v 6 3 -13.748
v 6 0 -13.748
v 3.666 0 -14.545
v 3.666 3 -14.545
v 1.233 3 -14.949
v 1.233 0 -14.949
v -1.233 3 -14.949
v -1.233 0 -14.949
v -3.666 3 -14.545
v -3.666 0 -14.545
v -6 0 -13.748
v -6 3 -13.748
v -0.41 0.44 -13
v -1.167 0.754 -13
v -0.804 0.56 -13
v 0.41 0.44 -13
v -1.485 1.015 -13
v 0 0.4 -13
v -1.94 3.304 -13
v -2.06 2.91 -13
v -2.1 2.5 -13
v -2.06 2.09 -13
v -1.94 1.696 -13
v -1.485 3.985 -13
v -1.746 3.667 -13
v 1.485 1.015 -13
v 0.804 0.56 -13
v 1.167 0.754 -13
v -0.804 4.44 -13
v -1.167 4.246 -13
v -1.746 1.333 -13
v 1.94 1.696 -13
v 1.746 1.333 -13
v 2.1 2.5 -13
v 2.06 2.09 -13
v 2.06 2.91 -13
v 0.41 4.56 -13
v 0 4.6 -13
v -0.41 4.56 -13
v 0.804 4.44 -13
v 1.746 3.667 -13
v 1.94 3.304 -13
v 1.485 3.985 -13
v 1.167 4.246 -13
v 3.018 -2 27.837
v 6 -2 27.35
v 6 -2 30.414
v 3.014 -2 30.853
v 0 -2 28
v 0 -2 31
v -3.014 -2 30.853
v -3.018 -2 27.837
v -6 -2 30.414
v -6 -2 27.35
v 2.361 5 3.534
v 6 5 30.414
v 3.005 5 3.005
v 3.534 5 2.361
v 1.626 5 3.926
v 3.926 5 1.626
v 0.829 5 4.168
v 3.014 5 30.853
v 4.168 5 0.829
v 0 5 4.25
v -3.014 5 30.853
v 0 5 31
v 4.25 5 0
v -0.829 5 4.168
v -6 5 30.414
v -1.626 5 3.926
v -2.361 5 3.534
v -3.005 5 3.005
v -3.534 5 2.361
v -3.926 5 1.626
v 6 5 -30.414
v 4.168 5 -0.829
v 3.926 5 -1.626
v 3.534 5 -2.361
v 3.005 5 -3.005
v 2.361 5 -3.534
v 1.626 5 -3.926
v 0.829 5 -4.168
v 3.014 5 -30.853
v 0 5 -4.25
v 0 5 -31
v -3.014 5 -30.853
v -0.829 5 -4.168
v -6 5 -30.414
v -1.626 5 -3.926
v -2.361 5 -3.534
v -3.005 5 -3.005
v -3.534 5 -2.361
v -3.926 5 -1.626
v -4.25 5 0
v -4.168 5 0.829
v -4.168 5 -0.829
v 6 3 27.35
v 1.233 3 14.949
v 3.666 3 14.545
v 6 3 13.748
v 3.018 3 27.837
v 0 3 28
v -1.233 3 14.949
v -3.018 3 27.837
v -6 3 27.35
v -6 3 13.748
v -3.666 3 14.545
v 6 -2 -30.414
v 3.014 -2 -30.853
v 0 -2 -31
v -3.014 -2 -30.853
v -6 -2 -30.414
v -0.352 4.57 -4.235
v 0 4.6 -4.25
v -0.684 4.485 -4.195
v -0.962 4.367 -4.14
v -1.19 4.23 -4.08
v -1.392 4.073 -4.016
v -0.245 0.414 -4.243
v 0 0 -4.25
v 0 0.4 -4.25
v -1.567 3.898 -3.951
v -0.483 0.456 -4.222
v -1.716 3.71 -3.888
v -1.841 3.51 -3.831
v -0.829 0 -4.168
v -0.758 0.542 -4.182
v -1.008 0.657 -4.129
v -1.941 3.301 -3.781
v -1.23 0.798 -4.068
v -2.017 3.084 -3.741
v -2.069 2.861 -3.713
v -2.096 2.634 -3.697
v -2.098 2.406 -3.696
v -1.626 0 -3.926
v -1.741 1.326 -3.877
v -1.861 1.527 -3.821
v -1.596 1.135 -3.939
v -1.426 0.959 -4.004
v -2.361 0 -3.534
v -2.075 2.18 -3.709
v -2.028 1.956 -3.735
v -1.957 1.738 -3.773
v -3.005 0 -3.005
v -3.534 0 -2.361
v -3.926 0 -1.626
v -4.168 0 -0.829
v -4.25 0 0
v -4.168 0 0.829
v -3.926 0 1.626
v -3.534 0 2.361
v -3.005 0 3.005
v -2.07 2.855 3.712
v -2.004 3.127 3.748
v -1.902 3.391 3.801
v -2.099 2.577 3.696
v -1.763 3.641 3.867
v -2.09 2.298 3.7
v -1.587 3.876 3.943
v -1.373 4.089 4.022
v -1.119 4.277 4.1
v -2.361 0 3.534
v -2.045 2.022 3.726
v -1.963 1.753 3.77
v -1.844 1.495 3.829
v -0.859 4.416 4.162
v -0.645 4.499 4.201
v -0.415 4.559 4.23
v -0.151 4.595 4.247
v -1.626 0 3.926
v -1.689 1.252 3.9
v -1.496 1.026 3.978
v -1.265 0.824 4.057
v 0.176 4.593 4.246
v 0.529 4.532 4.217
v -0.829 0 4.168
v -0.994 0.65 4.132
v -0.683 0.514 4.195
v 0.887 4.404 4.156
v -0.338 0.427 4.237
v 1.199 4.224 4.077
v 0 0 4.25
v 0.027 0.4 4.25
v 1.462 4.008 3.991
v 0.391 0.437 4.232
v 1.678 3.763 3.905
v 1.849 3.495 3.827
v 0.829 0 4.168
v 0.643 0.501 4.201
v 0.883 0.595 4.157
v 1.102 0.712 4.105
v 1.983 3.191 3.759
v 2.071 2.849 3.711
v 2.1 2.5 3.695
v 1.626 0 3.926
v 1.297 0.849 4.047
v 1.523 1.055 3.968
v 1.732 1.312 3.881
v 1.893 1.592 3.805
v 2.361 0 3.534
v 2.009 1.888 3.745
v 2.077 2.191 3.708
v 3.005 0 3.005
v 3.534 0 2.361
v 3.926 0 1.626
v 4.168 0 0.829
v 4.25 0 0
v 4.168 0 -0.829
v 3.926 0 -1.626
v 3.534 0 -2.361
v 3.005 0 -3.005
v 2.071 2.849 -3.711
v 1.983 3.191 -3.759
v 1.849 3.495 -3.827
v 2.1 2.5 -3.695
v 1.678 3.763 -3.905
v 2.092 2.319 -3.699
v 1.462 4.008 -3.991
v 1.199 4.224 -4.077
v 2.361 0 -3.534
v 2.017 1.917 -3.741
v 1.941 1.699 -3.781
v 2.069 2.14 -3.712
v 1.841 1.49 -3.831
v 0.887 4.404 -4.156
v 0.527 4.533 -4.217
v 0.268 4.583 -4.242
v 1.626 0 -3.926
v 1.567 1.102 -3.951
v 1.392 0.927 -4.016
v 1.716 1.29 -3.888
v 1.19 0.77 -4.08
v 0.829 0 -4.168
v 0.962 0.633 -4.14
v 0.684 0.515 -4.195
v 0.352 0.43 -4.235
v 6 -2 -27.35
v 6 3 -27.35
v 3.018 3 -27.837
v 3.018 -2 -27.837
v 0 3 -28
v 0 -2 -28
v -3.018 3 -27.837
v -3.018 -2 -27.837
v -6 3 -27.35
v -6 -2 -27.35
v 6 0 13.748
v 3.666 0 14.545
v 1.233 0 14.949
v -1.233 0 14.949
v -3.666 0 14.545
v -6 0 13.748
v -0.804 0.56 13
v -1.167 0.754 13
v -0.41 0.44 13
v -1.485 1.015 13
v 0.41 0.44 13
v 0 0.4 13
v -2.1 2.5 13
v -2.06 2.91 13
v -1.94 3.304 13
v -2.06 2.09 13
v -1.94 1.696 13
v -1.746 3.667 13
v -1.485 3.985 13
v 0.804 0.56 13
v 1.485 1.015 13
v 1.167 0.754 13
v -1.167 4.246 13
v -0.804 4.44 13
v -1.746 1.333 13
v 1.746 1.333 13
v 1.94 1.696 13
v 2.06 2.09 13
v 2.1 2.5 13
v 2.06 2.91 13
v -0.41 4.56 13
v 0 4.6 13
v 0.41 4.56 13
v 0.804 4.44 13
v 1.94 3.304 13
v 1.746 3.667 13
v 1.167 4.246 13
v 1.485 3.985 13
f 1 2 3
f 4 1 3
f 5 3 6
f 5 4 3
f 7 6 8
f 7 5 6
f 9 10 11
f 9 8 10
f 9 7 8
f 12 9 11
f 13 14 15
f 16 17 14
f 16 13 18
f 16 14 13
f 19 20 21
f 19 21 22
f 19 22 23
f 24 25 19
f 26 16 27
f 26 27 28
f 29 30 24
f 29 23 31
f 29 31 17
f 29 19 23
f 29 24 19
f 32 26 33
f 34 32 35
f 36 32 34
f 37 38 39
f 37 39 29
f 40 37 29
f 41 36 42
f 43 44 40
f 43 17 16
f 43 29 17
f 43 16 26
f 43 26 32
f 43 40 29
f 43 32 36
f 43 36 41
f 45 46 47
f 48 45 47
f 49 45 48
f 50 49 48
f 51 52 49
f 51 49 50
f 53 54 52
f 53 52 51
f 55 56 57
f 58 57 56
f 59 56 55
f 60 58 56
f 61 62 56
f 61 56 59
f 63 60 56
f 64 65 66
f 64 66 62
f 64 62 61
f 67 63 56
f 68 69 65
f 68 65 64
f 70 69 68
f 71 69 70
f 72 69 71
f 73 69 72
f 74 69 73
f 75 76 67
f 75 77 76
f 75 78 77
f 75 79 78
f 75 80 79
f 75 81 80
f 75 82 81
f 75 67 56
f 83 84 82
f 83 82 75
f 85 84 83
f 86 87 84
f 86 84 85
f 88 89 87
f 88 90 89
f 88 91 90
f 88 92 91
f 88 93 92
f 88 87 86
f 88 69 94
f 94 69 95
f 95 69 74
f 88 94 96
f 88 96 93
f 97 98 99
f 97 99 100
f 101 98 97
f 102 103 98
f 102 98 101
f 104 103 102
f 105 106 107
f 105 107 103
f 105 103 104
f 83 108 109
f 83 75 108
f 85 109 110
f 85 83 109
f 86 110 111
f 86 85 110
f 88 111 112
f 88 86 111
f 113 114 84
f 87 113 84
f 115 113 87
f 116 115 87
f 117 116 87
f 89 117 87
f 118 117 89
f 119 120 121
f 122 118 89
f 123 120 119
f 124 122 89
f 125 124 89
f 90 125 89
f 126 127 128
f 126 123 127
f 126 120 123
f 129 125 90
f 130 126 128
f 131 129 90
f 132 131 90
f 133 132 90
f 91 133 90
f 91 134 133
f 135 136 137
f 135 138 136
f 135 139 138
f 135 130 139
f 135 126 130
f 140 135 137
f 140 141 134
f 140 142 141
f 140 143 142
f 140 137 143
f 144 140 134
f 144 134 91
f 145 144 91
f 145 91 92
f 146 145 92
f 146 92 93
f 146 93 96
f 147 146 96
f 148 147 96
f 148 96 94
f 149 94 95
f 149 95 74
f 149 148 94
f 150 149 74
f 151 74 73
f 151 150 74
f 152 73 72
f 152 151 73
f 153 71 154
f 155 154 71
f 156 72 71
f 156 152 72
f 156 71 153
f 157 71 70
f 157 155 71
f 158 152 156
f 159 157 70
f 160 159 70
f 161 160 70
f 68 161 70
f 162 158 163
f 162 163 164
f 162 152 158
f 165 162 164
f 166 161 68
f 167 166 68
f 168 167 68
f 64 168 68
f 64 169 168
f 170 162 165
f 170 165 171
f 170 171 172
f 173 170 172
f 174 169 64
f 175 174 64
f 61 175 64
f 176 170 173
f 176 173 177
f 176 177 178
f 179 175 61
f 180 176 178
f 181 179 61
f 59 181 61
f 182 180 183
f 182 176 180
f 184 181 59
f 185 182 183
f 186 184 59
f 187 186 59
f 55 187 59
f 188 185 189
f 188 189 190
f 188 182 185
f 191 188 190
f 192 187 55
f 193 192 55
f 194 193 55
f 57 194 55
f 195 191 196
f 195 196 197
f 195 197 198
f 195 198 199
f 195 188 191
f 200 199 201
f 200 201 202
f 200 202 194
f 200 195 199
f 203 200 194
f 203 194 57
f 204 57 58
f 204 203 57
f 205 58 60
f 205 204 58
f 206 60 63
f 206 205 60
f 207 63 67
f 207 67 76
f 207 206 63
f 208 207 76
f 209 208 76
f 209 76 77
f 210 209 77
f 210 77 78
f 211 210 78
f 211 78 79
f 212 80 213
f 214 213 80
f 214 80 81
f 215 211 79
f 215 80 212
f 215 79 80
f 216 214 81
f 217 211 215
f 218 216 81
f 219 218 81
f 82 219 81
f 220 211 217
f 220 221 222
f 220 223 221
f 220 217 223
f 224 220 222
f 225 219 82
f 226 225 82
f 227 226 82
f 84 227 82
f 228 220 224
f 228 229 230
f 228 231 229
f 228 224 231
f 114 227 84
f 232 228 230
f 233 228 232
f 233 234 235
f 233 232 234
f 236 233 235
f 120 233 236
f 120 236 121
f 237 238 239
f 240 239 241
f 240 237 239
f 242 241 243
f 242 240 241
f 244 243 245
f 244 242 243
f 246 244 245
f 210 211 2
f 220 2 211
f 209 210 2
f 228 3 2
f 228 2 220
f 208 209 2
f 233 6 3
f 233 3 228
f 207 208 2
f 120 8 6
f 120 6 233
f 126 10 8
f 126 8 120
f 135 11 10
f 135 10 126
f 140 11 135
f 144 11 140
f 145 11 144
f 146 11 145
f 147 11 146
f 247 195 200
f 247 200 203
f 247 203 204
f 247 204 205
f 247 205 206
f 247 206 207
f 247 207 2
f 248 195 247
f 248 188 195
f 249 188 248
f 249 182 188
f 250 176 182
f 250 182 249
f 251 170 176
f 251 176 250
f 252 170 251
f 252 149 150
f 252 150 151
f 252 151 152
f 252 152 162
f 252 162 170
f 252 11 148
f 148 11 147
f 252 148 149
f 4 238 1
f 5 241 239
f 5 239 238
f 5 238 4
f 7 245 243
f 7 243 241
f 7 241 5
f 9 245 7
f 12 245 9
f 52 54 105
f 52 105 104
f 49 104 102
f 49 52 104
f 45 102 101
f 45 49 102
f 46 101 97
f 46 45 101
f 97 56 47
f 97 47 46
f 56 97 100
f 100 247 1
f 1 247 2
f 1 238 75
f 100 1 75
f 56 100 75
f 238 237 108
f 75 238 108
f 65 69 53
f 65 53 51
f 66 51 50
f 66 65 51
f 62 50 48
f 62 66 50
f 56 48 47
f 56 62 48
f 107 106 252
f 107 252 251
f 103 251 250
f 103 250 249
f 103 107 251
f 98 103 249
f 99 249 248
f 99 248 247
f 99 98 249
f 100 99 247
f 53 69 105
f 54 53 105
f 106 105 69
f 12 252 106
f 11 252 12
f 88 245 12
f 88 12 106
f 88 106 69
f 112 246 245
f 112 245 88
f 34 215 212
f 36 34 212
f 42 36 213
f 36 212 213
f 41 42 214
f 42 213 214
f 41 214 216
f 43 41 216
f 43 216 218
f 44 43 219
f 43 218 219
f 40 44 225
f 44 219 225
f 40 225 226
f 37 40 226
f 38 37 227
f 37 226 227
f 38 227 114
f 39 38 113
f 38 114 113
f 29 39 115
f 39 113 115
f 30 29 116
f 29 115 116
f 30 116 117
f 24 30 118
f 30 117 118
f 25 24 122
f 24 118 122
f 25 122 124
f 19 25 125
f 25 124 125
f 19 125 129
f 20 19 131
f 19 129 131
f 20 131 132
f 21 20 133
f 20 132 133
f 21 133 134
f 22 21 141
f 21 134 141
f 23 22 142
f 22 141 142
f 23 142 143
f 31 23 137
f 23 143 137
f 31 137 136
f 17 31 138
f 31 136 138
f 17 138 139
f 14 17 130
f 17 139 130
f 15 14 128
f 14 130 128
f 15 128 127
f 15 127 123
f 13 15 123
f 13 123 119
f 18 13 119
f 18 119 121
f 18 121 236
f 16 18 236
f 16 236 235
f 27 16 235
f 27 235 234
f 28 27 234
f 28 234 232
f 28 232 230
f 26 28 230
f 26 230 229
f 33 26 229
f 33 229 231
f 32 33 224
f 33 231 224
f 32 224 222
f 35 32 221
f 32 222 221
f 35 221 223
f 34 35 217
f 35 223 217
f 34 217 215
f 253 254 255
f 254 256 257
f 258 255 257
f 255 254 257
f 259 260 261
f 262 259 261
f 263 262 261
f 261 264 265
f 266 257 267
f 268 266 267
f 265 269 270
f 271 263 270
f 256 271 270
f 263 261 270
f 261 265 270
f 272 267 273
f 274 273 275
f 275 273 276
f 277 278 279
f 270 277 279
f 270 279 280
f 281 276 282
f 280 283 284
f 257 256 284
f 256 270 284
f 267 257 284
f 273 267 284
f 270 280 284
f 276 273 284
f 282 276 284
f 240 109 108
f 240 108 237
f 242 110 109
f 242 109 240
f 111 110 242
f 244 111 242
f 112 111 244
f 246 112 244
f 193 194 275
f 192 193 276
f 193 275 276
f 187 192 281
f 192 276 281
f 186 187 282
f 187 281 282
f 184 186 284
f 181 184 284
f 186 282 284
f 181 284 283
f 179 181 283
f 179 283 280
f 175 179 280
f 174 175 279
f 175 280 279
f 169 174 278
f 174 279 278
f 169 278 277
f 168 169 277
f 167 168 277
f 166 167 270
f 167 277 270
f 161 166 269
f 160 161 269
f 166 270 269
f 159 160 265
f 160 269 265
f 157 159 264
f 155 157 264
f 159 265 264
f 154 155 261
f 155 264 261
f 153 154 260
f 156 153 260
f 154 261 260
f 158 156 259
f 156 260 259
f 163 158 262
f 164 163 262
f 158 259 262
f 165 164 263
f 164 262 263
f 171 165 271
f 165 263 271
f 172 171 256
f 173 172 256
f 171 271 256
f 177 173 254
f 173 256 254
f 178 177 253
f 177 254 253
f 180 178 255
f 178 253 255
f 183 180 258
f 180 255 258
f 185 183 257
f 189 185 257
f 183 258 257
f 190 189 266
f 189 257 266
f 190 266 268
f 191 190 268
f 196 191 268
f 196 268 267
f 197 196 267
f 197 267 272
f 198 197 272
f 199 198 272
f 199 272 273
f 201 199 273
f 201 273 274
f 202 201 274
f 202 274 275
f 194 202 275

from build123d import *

# Parameters (mm, degrees)
CORTE_EXTRUS_O1_DEPTH      = 45.395945761
CORTE_EXTRUS_O1_DEPTH_BACK = 45.395945761
ESBO_O2_W                  = 96.741183006
ESBO_O2_H                  = 102.357875962
ESBO_O2_W_2                = 12
ESBO_O2_H_2                = 76.270119436
ESBO_O3_R                  = 2.1
CORTE_EXTRUS_O4_DEPTH      = 13


with BuildPart() as part:
    # Esboço1 → Revolução1 (revolve)
    with BuildSketch(Plane.XY, mode=Mode.PRIVATE) as revolu_o1_sk:
        Polygon((4.25, 5), (4.25, 0), (15, 0), (15, 3), (28, 3), (28, -2), (31, -2), (31, 5), align=None)
    revolve(revolu_o1_sk.sketch.rotate(Axis((0, 0, 0), (0, 1, 0)), 90), axis=Axis((0, 0, 0), (0, 1, 0)))

    # Esboço2 → Corte-extrusão1 (cut, two sides: drawn at the far end of the back side and taken through both)
    with BuildSketch(Plane(origin=(0, 5, 0), x_dir=(1, 0, 0), z_dir=(0, 1, 0)).offset(-CORTE_EXTRUS_O1_DEPTH_BACK)):
        Rectangle(ESBO_O2_W, ESBO_O2_H)
        Rectangle(ESBO_O2_W_2, ESBO_O2_H_2, mode=Mode.SUBTRACT)
    extrude(amount=CORTE_EXTRUS_O1_DEPTH + CORTE_EXTRUS_O1_DEPTH_BACK, mode=Mode.SUBTRACT)

    # Esboço3 → Corte-extrusão4 (cut, symmetric)
    with BuildSketch(Plane.XY):
        with Locations((0, 2.5)):
            Circle(ESBO_O3_R)
    extrude(amount=CORTE_EXTRUS_O4_DEPTH, both=True, mode=Mode.SUBTRACT)


solid = part.part
